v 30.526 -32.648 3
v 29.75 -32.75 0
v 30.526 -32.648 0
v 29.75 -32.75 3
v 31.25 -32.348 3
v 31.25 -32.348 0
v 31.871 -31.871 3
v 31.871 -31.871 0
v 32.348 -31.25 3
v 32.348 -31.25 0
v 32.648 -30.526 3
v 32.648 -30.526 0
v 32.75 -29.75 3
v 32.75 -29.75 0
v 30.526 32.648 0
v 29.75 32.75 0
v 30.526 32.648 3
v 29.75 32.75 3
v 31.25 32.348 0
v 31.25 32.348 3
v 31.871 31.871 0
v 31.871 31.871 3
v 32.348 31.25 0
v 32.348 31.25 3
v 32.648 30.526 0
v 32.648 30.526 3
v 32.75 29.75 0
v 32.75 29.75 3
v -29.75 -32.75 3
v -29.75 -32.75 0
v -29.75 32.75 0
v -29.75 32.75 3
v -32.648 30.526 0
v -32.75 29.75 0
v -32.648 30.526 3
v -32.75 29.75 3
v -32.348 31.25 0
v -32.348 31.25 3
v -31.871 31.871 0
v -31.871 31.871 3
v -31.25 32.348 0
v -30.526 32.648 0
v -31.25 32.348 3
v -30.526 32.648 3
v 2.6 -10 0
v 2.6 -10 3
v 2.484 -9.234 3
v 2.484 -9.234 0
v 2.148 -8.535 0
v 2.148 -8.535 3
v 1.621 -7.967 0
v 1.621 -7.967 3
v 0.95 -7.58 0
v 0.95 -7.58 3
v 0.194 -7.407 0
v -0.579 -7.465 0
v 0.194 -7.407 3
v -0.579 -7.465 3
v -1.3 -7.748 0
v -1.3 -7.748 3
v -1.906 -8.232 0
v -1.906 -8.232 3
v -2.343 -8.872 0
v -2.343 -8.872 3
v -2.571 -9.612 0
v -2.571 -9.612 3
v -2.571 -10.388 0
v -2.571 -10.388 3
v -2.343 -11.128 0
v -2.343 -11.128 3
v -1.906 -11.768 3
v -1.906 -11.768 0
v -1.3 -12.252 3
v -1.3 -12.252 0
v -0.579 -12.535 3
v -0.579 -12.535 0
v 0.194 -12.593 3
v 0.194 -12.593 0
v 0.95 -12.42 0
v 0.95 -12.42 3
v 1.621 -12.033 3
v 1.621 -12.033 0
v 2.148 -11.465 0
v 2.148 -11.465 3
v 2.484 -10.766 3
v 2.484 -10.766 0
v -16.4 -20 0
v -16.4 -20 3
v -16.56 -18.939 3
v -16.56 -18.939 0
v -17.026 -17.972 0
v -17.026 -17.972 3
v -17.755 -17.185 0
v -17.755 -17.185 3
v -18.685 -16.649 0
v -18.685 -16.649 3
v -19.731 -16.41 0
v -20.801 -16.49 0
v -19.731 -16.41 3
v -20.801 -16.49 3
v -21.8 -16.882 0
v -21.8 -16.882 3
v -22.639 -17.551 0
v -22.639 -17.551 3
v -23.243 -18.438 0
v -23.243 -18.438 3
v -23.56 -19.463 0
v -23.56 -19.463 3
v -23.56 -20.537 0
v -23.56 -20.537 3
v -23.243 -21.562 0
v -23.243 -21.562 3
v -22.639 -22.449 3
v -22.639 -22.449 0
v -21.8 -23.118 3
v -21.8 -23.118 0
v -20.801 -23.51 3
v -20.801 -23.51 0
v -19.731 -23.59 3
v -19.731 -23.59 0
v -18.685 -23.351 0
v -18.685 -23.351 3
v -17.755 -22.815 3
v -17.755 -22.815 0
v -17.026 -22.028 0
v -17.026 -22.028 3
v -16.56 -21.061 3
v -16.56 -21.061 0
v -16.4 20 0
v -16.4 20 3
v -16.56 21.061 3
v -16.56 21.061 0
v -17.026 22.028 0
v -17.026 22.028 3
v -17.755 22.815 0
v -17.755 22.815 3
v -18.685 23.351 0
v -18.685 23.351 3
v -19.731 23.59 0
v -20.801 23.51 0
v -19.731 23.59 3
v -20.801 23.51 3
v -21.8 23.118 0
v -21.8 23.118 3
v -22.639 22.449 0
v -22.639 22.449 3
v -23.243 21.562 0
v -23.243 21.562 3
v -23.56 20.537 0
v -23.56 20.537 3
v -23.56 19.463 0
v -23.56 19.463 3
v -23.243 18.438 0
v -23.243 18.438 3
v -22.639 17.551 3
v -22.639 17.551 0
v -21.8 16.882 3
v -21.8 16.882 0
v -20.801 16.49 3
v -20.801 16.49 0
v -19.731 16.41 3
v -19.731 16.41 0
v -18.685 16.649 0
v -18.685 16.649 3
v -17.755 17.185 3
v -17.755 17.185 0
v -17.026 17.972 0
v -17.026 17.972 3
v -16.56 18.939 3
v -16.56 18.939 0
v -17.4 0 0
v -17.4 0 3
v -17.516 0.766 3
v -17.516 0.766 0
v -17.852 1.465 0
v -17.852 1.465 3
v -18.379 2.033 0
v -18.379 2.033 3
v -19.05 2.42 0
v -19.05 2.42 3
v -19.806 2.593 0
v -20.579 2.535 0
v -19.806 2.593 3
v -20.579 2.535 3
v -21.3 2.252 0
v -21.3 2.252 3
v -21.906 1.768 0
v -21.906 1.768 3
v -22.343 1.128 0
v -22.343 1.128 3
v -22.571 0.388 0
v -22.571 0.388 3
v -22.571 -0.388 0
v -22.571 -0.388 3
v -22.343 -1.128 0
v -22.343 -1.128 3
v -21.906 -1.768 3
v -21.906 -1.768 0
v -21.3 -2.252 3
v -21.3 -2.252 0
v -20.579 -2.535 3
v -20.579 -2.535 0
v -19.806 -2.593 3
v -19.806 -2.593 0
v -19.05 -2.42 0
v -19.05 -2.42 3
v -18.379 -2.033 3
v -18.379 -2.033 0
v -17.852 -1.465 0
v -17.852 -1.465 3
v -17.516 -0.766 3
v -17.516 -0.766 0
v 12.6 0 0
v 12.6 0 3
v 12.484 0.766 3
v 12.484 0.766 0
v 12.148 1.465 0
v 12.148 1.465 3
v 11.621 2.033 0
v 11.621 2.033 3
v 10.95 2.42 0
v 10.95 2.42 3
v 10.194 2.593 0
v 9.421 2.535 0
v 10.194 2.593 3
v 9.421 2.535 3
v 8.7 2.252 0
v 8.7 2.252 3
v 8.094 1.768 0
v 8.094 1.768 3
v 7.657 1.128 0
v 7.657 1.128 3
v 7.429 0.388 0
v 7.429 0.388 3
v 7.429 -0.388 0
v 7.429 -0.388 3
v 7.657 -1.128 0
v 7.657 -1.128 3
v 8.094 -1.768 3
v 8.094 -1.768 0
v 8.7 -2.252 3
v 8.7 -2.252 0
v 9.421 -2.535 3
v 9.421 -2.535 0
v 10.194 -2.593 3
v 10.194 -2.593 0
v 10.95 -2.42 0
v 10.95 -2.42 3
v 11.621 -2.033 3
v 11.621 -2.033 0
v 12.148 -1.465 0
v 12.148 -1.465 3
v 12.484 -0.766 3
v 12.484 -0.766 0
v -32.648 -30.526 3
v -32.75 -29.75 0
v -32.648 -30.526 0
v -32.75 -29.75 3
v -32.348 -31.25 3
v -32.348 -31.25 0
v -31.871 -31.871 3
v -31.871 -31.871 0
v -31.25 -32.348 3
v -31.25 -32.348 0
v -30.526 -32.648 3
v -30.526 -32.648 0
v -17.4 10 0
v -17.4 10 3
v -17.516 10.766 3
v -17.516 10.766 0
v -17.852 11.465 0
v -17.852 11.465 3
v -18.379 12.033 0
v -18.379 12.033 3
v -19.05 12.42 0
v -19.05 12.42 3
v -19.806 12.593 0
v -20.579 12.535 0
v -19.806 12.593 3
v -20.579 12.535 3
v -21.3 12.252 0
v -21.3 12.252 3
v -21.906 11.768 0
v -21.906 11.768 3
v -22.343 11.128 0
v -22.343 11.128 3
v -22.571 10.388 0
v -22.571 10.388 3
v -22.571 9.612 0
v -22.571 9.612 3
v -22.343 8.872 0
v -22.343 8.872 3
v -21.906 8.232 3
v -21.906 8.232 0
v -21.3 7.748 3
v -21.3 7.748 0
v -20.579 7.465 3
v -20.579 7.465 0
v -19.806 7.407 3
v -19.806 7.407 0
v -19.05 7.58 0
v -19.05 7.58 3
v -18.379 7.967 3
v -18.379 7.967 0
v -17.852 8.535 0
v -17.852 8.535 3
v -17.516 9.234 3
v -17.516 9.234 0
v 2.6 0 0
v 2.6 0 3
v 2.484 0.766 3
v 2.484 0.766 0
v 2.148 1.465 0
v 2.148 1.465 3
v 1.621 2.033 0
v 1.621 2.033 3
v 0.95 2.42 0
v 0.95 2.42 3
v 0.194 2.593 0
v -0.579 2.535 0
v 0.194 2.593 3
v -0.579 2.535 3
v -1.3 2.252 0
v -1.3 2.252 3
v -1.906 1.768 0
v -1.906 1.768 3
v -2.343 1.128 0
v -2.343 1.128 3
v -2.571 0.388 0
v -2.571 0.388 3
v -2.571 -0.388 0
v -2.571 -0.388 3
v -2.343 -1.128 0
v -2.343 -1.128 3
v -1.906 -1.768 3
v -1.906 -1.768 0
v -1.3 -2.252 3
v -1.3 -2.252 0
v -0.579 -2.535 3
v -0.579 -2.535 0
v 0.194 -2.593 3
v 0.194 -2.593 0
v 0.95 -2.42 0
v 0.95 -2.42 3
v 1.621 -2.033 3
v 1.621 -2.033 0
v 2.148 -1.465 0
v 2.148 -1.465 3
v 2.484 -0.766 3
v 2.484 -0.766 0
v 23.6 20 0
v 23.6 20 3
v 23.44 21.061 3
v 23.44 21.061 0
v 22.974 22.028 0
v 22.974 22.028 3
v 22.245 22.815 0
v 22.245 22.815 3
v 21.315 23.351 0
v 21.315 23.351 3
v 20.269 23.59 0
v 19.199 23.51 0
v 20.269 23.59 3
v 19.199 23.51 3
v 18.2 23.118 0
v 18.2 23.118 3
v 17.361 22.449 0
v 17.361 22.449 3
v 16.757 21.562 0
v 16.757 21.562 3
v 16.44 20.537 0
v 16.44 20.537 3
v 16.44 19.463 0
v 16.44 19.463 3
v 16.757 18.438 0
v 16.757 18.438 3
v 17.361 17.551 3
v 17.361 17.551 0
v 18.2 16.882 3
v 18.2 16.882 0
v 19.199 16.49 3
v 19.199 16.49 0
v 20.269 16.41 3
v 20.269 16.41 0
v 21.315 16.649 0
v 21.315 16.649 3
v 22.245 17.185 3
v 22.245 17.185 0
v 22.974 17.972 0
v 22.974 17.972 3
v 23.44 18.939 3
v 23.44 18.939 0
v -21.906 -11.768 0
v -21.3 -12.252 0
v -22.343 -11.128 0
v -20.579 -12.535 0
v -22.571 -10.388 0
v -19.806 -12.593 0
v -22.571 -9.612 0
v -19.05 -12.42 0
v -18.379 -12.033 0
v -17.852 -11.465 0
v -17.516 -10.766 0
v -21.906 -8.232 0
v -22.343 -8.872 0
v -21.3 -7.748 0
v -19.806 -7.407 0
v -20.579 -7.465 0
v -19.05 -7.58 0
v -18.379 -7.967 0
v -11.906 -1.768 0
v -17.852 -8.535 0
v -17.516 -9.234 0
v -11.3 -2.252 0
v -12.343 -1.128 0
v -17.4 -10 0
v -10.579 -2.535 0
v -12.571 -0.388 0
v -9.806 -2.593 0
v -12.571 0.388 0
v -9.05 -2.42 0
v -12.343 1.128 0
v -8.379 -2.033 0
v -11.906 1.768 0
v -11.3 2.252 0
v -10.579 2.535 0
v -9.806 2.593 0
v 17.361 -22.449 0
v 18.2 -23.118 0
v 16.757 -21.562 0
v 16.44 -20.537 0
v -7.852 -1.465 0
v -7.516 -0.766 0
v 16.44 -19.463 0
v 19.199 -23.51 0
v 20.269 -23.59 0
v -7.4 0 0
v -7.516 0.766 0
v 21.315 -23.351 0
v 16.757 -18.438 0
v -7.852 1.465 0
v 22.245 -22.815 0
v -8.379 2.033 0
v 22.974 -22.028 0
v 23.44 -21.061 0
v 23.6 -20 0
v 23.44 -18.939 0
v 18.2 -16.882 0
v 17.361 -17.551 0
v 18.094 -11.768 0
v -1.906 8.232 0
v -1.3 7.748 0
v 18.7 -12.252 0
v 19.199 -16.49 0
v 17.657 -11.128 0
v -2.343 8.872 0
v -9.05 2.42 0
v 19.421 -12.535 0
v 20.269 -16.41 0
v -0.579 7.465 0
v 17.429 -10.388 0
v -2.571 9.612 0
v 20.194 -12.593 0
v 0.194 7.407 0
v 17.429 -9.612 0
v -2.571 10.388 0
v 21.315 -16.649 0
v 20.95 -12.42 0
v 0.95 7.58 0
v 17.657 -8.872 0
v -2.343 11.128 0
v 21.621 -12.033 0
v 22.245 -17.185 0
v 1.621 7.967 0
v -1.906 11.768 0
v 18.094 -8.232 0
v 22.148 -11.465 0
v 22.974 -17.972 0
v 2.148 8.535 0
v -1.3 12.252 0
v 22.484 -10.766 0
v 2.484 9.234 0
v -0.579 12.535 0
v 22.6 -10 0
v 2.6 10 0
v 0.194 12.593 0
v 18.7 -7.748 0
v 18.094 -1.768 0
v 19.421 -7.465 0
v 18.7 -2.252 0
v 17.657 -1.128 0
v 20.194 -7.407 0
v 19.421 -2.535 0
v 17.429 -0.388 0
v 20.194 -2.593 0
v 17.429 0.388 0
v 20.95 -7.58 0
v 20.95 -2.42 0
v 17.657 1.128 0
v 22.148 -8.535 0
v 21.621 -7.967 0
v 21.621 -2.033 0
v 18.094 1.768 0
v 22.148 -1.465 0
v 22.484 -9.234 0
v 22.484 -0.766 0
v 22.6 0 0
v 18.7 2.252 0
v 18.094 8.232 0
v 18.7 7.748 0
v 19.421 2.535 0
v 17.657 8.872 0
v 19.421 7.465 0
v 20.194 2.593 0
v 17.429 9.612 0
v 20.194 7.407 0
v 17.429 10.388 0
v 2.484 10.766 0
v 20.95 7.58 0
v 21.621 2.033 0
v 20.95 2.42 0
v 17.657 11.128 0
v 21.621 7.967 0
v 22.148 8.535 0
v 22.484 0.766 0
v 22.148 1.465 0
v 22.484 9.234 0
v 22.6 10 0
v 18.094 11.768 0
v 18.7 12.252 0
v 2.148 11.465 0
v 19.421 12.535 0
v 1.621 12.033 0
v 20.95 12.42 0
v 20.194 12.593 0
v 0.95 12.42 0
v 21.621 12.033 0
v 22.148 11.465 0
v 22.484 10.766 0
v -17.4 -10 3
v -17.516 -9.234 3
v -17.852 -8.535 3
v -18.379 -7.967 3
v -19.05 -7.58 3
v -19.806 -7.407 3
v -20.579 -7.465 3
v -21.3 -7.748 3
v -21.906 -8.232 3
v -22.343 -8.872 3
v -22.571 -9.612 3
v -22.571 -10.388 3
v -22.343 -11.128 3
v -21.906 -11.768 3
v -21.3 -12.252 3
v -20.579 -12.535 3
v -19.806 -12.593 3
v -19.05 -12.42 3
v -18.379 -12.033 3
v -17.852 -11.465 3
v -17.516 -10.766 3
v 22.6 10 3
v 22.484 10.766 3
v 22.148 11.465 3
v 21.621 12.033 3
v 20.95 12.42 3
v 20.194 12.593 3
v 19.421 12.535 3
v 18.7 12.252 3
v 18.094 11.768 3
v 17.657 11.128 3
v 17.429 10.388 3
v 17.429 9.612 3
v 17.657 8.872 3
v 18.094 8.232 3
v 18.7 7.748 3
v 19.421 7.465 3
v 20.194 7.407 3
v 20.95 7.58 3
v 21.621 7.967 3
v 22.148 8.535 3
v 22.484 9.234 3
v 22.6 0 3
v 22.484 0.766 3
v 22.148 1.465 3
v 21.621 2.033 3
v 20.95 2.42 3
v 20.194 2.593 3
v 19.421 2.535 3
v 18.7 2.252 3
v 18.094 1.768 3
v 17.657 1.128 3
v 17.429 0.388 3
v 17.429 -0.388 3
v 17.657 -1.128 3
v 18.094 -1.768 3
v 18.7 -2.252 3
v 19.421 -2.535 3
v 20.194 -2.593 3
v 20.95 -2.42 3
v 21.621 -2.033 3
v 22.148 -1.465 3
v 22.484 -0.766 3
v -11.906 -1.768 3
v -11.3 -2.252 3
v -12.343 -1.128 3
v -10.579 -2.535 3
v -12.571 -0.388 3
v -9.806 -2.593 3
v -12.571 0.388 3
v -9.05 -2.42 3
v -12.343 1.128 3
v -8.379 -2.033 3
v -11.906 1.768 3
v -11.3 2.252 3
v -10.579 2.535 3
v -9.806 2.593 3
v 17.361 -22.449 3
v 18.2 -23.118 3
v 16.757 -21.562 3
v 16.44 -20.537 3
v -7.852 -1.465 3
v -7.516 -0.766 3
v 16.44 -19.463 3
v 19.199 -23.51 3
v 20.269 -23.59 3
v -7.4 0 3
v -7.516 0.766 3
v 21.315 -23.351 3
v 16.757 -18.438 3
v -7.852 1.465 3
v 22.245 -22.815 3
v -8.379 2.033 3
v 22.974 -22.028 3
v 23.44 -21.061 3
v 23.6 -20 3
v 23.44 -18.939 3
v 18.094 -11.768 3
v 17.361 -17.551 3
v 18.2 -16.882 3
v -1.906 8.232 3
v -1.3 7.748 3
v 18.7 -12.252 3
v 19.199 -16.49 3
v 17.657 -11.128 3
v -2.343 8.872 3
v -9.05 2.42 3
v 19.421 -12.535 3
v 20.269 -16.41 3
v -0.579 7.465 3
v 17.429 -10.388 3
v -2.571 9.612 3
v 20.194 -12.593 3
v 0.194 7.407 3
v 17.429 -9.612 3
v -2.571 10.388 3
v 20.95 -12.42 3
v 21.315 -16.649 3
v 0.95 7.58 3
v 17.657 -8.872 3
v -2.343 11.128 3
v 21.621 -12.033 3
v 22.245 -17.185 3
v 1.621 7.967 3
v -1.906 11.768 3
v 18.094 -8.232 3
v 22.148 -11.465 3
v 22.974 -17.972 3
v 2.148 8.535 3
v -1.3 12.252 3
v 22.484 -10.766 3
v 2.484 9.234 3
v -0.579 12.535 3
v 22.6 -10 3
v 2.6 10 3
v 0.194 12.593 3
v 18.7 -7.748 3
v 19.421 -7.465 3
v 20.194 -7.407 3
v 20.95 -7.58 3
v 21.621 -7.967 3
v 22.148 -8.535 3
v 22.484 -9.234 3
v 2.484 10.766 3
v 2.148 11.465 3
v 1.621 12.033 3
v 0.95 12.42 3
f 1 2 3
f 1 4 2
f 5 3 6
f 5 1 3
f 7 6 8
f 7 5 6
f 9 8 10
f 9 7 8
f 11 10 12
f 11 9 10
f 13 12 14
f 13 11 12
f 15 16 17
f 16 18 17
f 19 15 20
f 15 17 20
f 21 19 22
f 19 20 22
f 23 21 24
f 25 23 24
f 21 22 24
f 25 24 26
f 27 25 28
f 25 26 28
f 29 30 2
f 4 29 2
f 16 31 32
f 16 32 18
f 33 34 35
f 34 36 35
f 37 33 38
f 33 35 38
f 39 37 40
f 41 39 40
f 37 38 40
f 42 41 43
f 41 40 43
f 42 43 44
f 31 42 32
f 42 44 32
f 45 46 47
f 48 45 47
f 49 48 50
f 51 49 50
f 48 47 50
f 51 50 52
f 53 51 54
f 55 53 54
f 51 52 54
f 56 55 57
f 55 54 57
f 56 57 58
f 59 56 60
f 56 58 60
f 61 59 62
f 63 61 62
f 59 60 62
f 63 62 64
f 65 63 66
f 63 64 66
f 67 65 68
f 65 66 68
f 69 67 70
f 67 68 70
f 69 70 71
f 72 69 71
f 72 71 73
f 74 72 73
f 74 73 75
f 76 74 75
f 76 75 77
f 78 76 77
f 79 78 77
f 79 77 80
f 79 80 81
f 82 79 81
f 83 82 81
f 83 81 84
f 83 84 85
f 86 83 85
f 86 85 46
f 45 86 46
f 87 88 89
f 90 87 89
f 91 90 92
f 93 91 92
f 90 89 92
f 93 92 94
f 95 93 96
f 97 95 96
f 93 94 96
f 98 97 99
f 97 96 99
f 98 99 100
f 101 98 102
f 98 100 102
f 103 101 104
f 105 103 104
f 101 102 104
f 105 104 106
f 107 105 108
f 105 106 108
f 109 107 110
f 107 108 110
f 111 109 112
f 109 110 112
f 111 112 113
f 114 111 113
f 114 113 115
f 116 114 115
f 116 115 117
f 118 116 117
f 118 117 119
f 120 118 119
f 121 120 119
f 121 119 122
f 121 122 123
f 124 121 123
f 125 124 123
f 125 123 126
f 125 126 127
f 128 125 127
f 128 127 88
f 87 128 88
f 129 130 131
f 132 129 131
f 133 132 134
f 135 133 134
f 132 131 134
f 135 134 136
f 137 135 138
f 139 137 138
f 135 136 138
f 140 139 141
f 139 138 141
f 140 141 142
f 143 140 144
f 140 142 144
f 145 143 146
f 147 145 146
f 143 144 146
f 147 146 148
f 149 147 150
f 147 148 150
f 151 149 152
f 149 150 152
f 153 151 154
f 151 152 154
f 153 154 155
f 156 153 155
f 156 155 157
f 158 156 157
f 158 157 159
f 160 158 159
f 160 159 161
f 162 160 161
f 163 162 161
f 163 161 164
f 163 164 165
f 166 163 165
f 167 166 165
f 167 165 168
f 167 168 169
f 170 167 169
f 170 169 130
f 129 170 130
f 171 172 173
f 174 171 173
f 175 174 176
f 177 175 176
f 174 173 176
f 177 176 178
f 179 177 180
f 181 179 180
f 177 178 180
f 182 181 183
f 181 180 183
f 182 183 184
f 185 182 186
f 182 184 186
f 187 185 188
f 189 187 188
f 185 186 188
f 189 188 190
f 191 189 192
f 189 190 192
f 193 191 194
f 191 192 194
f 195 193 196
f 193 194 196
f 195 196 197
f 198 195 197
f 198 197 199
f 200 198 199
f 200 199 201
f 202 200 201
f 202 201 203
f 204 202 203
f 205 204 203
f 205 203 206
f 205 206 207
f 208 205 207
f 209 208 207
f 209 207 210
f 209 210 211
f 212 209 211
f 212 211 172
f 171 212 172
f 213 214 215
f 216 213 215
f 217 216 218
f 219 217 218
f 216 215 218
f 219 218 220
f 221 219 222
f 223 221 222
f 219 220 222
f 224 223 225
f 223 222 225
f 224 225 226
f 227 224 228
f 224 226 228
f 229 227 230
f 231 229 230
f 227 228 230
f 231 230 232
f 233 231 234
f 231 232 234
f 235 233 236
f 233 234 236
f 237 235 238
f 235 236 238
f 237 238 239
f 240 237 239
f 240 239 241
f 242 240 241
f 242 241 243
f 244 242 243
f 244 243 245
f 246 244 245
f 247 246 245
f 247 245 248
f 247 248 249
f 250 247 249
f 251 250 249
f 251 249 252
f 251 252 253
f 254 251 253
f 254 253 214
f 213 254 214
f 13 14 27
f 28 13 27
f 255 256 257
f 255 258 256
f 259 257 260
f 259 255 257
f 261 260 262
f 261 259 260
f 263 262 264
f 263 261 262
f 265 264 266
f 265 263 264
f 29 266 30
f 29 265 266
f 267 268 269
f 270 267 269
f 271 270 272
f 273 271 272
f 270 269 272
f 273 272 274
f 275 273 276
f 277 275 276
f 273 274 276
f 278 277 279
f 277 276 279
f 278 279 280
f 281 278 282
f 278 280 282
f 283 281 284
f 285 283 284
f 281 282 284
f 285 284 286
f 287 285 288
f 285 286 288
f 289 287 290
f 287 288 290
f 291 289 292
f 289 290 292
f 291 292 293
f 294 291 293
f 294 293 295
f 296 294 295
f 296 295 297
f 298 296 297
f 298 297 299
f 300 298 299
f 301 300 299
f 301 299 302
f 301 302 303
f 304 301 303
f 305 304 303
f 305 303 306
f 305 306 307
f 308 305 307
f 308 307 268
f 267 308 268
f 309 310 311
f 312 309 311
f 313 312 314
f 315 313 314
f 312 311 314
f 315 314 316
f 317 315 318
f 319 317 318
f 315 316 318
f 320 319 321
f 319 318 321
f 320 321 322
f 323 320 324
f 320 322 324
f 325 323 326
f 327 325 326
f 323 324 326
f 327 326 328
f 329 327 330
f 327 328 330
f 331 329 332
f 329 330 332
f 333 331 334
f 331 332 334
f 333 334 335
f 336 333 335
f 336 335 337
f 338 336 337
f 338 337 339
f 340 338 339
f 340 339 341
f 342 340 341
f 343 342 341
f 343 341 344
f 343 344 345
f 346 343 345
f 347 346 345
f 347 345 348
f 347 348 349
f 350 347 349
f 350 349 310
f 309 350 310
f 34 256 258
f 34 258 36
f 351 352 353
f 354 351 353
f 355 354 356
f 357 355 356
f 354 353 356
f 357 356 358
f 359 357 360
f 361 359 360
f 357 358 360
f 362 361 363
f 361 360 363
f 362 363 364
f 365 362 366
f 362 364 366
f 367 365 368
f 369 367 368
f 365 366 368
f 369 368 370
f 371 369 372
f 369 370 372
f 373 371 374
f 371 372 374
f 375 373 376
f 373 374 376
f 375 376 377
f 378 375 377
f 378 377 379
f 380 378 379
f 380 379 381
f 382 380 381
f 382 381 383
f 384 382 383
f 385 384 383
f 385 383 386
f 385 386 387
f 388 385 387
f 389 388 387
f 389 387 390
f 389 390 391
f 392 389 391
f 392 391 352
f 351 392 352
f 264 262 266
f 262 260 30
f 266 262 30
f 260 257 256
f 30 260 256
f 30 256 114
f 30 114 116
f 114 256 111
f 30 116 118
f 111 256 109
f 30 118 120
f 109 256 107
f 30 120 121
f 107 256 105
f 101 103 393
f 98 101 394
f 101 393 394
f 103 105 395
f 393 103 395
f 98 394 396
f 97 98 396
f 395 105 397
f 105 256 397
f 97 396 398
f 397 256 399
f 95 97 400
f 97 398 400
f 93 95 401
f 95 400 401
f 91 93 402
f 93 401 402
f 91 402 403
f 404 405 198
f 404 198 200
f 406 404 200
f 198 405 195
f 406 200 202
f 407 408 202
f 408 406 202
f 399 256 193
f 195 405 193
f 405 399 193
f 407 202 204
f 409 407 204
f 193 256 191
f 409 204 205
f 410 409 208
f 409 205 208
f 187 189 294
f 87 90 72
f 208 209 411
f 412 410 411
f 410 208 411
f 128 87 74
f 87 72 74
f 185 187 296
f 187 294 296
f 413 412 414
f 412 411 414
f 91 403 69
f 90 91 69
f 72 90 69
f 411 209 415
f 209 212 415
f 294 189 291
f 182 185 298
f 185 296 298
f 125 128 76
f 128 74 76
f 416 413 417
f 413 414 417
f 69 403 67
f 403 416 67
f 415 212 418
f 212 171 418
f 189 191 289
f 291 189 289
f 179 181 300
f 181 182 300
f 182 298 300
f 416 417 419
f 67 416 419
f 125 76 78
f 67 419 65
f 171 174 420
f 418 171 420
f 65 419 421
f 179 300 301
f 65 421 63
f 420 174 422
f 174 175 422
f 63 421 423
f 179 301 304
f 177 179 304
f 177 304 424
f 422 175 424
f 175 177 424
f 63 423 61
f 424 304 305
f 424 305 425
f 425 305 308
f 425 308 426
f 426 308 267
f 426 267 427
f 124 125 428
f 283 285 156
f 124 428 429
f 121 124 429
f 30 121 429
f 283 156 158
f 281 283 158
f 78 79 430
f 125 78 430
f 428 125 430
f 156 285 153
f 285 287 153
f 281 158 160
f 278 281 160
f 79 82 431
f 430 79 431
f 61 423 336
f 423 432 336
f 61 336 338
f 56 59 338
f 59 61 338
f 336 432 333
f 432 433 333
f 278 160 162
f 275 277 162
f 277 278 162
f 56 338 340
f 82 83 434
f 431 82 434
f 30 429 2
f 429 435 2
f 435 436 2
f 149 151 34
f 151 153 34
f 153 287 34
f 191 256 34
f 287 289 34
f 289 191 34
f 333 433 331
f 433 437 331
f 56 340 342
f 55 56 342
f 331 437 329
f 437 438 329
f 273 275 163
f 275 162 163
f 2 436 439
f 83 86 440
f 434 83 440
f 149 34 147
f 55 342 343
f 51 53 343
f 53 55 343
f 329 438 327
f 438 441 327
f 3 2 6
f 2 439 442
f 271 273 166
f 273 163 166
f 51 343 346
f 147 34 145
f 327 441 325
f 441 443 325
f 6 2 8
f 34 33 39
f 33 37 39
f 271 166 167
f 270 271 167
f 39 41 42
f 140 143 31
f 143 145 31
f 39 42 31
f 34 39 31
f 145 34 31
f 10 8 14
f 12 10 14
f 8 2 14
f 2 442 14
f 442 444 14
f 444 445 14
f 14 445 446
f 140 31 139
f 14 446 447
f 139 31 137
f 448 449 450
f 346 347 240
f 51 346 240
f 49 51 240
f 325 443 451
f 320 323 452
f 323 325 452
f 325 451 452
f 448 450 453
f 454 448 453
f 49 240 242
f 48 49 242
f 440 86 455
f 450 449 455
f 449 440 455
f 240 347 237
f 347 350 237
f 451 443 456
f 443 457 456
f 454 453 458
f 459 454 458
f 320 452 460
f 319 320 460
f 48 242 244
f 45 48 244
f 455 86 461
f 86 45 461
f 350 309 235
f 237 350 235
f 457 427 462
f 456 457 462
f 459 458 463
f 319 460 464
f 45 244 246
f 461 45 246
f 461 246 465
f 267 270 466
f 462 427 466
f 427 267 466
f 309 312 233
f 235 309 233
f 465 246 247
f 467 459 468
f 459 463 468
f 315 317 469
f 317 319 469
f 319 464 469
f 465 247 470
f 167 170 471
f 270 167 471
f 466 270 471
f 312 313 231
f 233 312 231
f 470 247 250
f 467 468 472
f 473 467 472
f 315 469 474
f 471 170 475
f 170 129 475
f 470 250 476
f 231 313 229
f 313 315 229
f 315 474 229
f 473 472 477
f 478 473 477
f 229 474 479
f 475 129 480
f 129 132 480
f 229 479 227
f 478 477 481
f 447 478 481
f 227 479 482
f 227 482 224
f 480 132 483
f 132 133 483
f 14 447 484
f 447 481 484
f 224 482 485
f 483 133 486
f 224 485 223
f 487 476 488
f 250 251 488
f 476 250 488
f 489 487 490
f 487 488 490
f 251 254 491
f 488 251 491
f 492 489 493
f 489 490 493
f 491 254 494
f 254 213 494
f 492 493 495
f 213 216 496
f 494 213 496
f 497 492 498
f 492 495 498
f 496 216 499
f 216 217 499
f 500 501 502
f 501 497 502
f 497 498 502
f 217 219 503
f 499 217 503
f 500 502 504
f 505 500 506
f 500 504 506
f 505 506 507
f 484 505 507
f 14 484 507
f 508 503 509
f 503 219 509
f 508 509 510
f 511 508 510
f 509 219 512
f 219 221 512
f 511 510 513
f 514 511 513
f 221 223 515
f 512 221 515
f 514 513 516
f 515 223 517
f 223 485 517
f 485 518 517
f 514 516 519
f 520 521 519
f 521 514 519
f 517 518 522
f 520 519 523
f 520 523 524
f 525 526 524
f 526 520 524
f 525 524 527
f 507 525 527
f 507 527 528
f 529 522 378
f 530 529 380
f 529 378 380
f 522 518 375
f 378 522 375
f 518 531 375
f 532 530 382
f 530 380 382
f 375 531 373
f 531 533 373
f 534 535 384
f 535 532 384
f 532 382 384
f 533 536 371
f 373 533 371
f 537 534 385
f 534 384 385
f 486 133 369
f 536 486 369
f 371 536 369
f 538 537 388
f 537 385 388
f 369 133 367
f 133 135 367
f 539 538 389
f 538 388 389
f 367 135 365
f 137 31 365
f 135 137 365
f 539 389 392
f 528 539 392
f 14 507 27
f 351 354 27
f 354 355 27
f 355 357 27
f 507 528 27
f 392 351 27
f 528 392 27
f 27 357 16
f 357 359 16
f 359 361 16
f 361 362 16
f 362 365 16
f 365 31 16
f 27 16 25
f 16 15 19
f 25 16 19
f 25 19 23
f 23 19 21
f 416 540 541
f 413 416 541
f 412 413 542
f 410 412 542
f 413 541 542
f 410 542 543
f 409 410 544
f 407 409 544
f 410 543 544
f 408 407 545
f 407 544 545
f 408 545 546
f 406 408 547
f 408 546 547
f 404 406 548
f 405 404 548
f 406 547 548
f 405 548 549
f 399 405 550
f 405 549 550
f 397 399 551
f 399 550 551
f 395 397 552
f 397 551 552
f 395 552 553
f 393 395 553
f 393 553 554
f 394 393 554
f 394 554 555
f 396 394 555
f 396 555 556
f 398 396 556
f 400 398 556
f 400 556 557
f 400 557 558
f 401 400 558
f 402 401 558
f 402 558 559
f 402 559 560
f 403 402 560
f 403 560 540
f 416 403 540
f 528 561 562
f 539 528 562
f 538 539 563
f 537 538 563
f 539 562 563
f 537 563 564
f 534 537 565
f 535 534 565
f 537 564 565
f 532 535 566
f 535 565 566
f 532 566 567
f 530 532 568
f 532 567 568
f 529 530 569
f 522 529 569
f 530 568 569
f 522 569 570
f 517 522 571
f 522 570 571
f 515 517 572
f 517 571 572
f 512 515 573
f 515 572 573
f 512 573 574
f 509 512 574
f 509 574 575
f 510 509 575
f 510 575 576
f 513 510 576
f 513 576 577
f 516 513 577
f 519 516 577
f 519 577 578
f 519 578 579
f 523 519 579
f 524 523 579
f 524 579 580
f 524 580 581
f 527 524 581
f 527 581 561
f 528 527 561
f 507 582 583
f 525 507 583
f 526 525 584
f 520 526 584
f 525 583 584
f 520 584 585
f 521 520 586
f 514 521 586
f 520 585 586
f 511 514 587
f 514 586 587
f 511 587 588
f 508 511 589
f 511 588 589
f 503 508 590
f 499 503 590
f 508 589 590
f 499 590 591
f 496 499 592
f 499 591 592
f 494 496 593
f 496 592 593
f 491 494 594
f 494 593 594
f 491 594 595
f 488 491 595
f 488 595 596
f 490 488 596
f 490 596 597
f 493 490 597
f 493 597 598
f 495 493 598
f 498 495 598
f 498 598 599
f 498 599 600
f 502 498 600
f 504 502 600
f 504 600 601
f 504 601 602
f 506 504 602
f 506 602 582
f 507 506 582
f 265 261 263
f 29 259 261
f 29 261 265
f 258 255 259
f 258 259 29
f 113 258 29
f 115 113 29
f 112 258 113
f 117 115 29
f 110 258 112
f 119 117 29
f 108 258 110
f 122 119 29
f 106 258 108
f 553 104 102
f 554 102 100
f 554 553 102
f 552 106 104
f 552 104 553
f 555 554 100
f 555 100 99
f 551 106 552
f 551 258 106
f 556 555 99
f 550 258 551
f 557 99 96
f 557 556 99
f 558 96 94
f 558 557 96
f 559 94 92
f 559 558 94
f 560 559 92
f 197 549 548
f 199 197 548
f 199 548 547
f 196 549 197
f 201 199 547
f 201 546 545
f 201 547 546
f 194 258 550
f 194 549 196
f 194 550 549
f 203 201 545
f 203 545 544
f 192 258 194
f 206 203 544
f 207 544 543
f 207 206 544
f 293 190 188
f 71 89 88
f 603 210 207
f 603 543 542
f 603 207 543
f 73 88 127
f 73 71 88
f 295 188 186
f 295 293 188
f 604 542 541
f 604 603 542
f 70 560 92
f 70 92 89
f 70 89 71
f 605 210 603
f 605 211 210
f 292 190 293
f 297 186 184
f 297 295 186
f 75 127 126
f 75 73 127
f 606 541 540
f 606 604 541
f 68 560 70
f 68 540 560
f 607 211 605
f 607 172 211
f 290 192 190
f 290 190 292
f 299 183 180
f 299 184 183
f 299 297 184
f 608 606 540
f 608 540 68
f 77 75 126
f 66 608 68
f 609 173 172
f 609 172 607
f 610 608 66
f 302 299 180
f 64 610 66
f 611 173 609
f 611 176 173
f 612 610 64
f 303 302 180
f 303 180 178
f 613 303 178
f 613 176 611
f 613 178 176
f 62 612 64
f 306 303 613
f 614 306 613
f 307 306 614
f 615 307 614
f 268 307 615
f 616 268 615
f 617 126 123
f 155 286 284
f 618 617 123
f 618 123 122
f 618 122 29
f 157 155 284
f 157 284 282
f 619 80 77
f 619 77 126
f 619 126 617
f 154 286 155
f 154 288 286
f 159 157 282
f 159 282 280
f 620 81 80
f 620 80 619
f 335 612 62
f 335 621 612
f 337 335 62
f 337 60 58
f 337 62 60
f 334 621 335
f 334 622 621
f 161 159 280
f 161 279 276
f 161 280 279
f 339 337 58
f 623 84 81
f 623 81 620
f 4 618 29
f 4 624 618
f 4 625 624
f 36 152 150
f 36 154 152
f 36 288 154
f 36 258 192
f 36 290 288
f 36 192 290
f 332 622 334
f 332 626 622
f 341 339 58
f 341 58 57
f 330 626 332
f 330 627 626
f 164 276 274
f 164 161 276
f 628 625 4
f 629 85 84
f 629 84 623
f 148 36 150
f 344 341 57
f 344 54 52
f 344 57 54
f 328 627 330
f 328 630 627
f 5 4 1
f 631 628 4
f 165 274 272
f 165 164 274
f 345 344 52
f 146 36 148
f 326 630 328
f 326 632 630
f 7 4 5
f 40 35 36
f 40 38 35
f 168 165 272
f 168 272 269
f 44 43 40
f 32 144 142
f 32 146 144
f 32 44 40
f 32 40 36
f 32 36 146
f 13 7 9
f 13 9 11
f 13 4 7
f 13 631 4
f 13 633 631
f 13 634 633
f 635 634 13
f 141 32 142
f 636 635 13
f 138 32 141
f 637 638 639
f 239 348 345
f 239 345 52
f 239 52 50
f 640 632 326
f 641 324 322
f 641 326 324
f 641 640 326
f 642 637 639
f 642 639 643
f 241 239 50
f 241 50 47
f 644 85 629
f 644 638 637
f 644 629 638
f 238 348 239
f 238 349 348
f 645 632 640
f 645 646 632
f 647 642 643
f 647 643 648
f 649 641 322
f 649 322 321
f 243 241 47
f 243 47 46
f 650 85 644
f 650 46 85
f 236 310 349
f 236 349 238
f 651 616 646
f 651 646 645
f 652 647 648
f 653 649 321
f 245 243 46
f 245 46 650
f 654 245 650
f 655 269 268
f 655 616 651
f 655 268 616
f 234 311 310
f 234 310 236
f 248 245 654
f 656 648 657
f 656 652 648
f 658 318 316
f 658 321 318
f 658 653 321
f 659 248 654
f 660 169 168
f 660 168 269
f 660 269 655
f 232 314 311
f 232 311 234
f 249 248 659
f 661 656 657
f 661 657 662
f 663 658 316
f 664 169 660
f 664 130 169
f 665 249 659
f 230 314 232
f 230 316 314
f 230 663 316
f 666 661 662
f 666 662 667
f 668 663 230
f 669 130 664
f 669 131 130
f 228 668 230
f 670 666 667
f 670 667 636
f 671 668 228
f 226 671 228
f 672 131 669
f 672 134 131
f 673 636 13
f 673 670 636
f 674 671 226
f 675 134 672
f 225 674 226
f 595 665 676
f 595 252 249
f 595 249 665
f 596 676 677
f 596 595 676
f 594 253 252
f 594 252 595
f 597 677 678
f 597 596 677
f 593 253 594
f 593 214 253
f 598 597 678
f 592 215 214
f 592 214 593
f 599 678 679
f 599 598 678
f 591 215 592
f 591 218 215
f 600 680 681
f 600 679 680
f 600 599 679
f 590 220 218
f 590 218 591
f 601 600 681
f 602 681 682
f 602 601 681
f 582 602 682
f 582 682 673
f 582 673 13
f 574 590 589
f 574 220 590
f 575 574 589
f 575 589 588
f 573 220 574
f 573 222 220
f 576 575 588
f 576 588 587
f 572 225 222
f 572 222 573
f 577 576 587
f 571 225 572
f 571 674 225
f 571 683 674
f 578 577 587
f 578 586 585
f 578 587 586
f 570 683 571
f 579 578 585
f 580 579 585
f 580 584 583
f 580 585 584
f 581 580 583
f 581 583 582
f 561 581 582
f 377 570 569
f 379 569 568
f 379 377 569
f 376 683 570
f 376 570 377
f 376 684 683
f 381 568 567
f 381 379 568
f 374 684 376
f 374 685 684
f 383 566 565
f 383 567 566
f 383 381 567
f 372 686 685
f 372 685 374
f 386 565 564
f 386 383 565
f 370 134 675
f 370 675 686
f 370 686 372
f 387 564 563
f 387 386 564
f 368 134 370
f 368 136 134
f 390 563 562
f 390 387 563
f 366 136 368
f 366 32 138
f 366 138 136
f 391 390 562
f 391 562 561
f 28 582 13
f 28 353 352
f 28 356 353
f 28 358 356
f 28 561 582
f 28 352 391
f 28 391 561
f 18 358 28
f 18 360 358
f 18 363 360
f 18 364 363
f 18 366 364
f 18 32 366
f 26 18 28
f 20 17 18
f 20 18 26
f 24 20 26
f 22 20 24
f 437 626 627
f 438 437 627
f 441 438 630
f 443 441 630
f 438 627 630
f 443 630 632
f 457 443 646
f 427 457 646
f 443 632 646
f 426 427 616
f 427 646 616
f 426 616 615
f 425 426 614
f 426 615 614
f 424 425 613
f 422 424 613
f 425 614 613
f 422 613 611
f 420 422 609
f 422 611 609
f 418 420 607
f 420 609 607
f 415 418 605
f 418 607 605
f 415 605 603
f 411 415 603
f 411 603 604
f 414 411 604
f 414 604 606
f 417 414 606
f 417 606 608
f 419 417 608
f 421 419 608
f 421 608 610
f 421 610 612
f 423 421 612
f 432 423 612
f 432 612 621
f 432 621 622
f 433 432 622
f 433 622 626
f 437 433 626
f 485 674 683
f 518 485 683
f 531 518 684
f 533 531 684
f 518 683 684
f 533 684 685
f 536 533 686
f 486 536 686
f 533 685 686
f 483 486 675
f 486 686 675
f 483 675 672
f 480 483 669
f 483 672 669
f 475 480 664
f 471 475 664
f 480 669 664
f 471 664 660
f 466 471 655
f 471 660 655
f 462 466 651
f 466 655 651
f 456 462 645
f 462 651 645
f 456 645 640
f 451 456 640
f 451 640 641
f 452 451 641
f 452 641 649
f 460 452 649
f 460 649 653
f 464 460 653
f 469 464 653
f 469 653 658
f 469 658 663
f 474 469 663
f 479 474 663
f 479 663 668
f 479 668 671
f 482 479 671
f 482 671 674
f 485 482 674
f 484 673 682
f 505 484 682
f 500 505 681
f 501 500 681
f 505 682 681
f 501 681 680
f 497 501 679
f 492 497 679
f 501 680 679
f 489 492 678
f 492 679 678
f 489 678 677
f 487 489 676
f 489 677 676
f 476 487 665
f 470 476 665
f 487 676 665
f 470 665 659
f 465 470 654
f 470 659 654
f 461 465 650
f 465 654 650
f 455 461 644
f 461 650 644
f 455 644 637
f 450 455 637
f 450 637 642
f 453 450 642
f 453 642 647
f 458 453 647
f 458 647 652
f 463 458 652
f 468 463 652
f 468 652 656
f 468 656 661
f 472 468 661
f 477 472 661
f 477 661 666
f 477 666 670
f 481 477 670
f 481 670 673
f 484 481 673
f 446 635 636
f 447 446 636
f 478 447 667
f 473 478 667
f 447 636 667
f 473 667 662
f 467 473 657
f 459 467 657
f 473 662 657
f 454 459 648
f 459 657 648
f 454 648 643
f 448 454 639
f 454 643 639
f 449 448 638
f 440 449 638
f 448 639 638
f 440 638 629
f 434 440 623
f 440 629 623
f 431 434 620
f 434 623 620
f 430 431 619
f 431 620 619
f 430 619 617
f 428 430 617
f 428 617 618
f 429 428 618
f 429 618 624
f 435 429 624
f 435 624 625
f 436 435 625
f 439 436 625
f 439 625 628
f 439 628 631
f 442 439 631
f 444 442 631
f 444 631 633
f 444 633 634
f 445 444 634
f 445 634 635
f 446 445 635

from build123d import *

# Parameters (mm, degrees)
SKETCH1_W           = 65.5
SKETCH1_H           = 65.5
BOSS_EXTRUDE1_DEPTH = 3
CUT_EXTRUDE1_REACH  = 48.413
SKETCH2_R           = 2.6
SKETCH2_R_2         = 3.6
FILLET1_R           = 3


with BuildPart() as part:
    # Sketch1 → Boss-Extrude1 (new body)
    with BuildSketch(Plane.XY):
        Rectangle(SKETCH1_W, SKETCH1_H)
    extrude(amount=BOSS_EXTRUDE1_DEPTH)

    # Sketch2 → Cut-Extrude1 (cut, up to next)
    with BuildSketch(Plane.XY.offset(3), mode=Mode.PRIVATE) as cut_extrude1_sk1:
        Circle(SKETCH2_R)
    cut_extrude1_tool1 = extrude(cut_extrude1_sk1.sketch, amount=-CUT_EXTRUDE1_REACH, mode=Mode.PRIVATE) & part.part
    # Sketch2 → Cut-Extrude1 (cut, up to next)
    with BuildSketch(Plane.XY.offset(3), mode=Mode.PRIVATE) as cut_extrude1_sk2:
        with Locations((10, 0)):
            Circle(SKETCH2_R)
    cut_extrude1_tool2 = extrude(cut_extrude1_sk2.sketch, amount=-CUT_EXTRUDE1_REACH, mode=Mode.PRIVATE) & part.part
    # Sketch2 → Cut-Extrude1 (cut, up to next)
    with BuildSketch(Plane.XY.offset(3), mode=Mode.PRIVATE) as cut_extrude1_sk3:
        with Locations((20, 0)):
            Circle(SKETCH2_R)
    cut_extrude1_tool3 = extrude(cut_extrude1_sk3.sketch, amount=-CUT_EXTRUDE1_REACH, mode=Mode.PRIVATE) & part.part
    # Sketch2 → Cut-Extrude1 (cut, up to next)
    with BuildSketch(Plane.XY.offset(3), mode=Mode.PRIVATE) as cut_extrude1_sk4:
        with Locations((0, -10)):
            Circle(SKETCH2_R)
    cut_extrude1_tool4 = extrude(cut_extrude1_sk4.sketch, amount=-CUT_EXTRUDE1_REACH, mode=Mode.PRIVATE) & part.part
    # Sketch2 → Cut-Extrude1 (cut, up to next)
    with BuildSketch(Plane.XY.offset(3), mode=Mode.PRIVATE) as cut_extrude1_sk5:
        with Locations((20, -10)):
            Circle(SKETCH2_R)
    cut_extrude1_tool5 = extrude(cut_extrude1_sk5.sketch, amount=-CUT_EXTRUDE1_REACH, mode=Mode.PRIVATE) & part.part
    # Sketch2 → Cut-Extrude1 (cut, up to next)
    with BuildSketch(Plane.XY.offset(3), mode=Mode.PRIVATE) as cut_extrude1_sk6:
        with Locations((20, 10)):
            Circle(SKETCH2_R)
    cut_extrude1_tool6 = extrude(cut_extrude1_sk6.sketch, amount=-CUT_EXTRUDE1_REACH, mode=Mode.PRIVATE) & part.part
    # Sketch2 → Cut-Extrude1 (cut, up to next)
    with BuildSketch(Plane.XY.offset(3), mode=Mode.PRIVATE) as cut_extrude1_sk7:
        with Locations((0, 10)):
            Circle(SKETCH2_R)
    cut_extrude1_tool7 = extrude(cut_extrude1_sk7.sketch, amount=-CUT_EXTRUDE1_REACH, mode=Mode.PRIVATE) & part.part
    # Sketch2 → Cut-Extrude1 (cut, up to next)
    with BuildSketch(Plane.XY.offset(3), mode=Mode.PRIVATE) as cut_extrude1_sk8:
        with Locations((-20, -10)):
            Circle(SKETCH2_R)
    cut_extrude1_tool8 = extrude(cut_extrude1_sk8.sketch, amount=-CUT_EXTRUDE1_REACH, mode=Mode.PRIVATE) & part.part
    # Sketch2 → Cut-Extrude1 (cut, up to next)
    with BuildSketch(Plane.XY.offset(3), mode=Mode.PRIVATE) as cut_extrude1_sk9:
        with Locations((-20, 10)):
            Circle(SKETCH2_R)
    cut_extrude1_tool9 = extrude(cut_extrude1_sk9.sketch, amount=-CUT_EXTRUDE1_REACH, mode=Mode.PRIVATE) & part.part
    # Sketch2 → Cut-Extrude1 (cut, up to next)
    with BuildSketch(Plane.XY.offset(3), mode=Mode.PRIVATE) as cut_extrude1_sk10:
        with Locations((-20, 0)):
            Circle(SKETCH2_R)
    cut_extrude1_tool10 = extrude(cut_extrude1_sk10.sketch, amount=-CUT_EXTRUDE1_REACH, mode=Mode.PRIVATE) & part.part
    # Sketch2 → Cut-Extrude1 (cut, up to next)
    with BuildSketch(Plane.XY.offset(3), mode=Mode.PRIVATE) as cut_extrude1_sk11:
        with Locations((-10, 0)):
            Circle(SKETCH2_R)
    cut_extrude1_tool11 = extrude(cut_extrude1_sk11.sketch, amount=-CUT_EXTRUDE1_REACH, mode=Mode.PRIVATE) & part.part
    # Sketch2 → Cut-Extrude1 (cut, up to next)
    with BuildSketch(Plane.XY.offset(3), mode=Mode.PRIVATE) as cut_extrude1_sk12:
        with Locations((-20, 20)):
            Circle(SKETCH2_R_2)
    cut_extrude1_tool12 = extrude(cut_extrude1_sk12.sketch, amount=-CUT_EXTRUDE1_REACH, mode=Mode.PRIVATE) & part.part
    # Sketch2 → Cut-Extrude1 (cut, up to next)
    with BuildSketch(Plane.XY.offset(3), mode=Mode.PRIVATE) as cut_extrude1_sk13:
        with Locations((20, 20)):
            Circle(SKETCH2_R_2)
    cut_extrude1_tool13 = extrude(cut_extrude1_sk13.sketch, amount=-CUT_EXTRUDE1_REACH, mode=Mode.PRIVATE) & part.part
    # Sketch2 → Cut-Extrude1 (cut, up to next)
    with BuildSketch(Plane.XY.offset(3), mode=Mode.PRIVATE) as cut_extrude1_sk14:
        with Locations((20, -20)):
            Circle(SKETCH2_R_2)
    cut_extrude1_tool14 = extrude(cut_extrude1_sk14.sketch, amount=-CUT_EXTRUDE1_REACH, mode=Mode.PRIVATE) & part.part
    # Sketch2 → Cut-Extrude1 (cut, up to next)
    with BuildSketch(Plane.XY.offset(3), mode=Mode.PRIVATE) as cut_extrude1_sk15:
        with Locations((-20, -20)):
            Circle(SKETCH2_R_2)
    cut_extrude1_tool15 = extrude(cut_extrude1_sk15.sketch, amount=-CUT_EXTRUDE1_REACH, mode=Mode.PRIVATE) & part.part
    add(cut_extrude1_tool1.solids().sort_by_distance((0, 0, 3))[0], mode=Mode.SUBTRACT)
    add(cut_extrude1_tool2.solids().sort_by_distance((10, 0, 3))[0], mode=Mode.SUBTRACT)
    add(cut_extrude1_tool3.solids().sort_by_distance((20, 0, 3))[0], mode=Mode.SUBTRACT)
    add(cut_extrude1_tool4.solids().sort_by_distance((0, -10, 3))[0], mode=Mode.SUBTRACT)
    add(cut_extrude1_tool5.solids().sort_by_distance((20, -10, 3))[0], mode=Mode.SUBTRACT)
    add(cut_extrude1_tool6.solids().sort_by_distance((20, 10, 3))[0], mode=Mode.SUBTRACT)
    add(cut_extrude1_tool7.solids().sort_by_distance((0, 10, 3))[0], mode=Mode.SUBTRACT)
    add(cut_extrude1_tool8.solids().sort_by_distance((-20, -10, 3))[0], mode=Mode.SUBTRACT)
    add(cut_extrude1_tool9.solids().sort_by_distance((-20, 10, 3))[0], mode=Mode.SUBTRACT)
    add(cut_extrude1_tool10.solids().sort_by_distance((-20, 0, 3))[0], mode=Mode.SUBTRACT)
    add(cut_extrude1_tool11.solids().sort_by_distance((-10, 0, 3))[0], mode=Mode.SUBTRACT)
    add(cut_extrude1_tool12.solids().sort_by_distance((-20, 20, 3))[0], mode=Mode.SUBTRACT)
    add(cut_extrude1_tool13.solids().sort_by_distance((20, 20, 3))[0], mode=Mode.SUBTRACT)
    add(cut_extrude1_tool14.solids().sort_by_distance((20, -20, 3))[0], mode=Mode.SUBTRACT)
    add(cut_extrude1_tool15.solids().sort_by_distance((-20, -20, 3))[0], mode=Mode.SUBTRACT)

    # Fillet1
    fillet1_edges = [part.edges().sort_by_distance(p)[0] for p in [
        (-32.75, 32.75, 1.5),
        (-32.75, -32.75, 1.5),
        (32.75, -32.75, 1.5),
        (32.75, 32.75, 1.5),
    ]]
    fillet(fillet1_edges, radius=FILLET1_R)


solid = part.part
